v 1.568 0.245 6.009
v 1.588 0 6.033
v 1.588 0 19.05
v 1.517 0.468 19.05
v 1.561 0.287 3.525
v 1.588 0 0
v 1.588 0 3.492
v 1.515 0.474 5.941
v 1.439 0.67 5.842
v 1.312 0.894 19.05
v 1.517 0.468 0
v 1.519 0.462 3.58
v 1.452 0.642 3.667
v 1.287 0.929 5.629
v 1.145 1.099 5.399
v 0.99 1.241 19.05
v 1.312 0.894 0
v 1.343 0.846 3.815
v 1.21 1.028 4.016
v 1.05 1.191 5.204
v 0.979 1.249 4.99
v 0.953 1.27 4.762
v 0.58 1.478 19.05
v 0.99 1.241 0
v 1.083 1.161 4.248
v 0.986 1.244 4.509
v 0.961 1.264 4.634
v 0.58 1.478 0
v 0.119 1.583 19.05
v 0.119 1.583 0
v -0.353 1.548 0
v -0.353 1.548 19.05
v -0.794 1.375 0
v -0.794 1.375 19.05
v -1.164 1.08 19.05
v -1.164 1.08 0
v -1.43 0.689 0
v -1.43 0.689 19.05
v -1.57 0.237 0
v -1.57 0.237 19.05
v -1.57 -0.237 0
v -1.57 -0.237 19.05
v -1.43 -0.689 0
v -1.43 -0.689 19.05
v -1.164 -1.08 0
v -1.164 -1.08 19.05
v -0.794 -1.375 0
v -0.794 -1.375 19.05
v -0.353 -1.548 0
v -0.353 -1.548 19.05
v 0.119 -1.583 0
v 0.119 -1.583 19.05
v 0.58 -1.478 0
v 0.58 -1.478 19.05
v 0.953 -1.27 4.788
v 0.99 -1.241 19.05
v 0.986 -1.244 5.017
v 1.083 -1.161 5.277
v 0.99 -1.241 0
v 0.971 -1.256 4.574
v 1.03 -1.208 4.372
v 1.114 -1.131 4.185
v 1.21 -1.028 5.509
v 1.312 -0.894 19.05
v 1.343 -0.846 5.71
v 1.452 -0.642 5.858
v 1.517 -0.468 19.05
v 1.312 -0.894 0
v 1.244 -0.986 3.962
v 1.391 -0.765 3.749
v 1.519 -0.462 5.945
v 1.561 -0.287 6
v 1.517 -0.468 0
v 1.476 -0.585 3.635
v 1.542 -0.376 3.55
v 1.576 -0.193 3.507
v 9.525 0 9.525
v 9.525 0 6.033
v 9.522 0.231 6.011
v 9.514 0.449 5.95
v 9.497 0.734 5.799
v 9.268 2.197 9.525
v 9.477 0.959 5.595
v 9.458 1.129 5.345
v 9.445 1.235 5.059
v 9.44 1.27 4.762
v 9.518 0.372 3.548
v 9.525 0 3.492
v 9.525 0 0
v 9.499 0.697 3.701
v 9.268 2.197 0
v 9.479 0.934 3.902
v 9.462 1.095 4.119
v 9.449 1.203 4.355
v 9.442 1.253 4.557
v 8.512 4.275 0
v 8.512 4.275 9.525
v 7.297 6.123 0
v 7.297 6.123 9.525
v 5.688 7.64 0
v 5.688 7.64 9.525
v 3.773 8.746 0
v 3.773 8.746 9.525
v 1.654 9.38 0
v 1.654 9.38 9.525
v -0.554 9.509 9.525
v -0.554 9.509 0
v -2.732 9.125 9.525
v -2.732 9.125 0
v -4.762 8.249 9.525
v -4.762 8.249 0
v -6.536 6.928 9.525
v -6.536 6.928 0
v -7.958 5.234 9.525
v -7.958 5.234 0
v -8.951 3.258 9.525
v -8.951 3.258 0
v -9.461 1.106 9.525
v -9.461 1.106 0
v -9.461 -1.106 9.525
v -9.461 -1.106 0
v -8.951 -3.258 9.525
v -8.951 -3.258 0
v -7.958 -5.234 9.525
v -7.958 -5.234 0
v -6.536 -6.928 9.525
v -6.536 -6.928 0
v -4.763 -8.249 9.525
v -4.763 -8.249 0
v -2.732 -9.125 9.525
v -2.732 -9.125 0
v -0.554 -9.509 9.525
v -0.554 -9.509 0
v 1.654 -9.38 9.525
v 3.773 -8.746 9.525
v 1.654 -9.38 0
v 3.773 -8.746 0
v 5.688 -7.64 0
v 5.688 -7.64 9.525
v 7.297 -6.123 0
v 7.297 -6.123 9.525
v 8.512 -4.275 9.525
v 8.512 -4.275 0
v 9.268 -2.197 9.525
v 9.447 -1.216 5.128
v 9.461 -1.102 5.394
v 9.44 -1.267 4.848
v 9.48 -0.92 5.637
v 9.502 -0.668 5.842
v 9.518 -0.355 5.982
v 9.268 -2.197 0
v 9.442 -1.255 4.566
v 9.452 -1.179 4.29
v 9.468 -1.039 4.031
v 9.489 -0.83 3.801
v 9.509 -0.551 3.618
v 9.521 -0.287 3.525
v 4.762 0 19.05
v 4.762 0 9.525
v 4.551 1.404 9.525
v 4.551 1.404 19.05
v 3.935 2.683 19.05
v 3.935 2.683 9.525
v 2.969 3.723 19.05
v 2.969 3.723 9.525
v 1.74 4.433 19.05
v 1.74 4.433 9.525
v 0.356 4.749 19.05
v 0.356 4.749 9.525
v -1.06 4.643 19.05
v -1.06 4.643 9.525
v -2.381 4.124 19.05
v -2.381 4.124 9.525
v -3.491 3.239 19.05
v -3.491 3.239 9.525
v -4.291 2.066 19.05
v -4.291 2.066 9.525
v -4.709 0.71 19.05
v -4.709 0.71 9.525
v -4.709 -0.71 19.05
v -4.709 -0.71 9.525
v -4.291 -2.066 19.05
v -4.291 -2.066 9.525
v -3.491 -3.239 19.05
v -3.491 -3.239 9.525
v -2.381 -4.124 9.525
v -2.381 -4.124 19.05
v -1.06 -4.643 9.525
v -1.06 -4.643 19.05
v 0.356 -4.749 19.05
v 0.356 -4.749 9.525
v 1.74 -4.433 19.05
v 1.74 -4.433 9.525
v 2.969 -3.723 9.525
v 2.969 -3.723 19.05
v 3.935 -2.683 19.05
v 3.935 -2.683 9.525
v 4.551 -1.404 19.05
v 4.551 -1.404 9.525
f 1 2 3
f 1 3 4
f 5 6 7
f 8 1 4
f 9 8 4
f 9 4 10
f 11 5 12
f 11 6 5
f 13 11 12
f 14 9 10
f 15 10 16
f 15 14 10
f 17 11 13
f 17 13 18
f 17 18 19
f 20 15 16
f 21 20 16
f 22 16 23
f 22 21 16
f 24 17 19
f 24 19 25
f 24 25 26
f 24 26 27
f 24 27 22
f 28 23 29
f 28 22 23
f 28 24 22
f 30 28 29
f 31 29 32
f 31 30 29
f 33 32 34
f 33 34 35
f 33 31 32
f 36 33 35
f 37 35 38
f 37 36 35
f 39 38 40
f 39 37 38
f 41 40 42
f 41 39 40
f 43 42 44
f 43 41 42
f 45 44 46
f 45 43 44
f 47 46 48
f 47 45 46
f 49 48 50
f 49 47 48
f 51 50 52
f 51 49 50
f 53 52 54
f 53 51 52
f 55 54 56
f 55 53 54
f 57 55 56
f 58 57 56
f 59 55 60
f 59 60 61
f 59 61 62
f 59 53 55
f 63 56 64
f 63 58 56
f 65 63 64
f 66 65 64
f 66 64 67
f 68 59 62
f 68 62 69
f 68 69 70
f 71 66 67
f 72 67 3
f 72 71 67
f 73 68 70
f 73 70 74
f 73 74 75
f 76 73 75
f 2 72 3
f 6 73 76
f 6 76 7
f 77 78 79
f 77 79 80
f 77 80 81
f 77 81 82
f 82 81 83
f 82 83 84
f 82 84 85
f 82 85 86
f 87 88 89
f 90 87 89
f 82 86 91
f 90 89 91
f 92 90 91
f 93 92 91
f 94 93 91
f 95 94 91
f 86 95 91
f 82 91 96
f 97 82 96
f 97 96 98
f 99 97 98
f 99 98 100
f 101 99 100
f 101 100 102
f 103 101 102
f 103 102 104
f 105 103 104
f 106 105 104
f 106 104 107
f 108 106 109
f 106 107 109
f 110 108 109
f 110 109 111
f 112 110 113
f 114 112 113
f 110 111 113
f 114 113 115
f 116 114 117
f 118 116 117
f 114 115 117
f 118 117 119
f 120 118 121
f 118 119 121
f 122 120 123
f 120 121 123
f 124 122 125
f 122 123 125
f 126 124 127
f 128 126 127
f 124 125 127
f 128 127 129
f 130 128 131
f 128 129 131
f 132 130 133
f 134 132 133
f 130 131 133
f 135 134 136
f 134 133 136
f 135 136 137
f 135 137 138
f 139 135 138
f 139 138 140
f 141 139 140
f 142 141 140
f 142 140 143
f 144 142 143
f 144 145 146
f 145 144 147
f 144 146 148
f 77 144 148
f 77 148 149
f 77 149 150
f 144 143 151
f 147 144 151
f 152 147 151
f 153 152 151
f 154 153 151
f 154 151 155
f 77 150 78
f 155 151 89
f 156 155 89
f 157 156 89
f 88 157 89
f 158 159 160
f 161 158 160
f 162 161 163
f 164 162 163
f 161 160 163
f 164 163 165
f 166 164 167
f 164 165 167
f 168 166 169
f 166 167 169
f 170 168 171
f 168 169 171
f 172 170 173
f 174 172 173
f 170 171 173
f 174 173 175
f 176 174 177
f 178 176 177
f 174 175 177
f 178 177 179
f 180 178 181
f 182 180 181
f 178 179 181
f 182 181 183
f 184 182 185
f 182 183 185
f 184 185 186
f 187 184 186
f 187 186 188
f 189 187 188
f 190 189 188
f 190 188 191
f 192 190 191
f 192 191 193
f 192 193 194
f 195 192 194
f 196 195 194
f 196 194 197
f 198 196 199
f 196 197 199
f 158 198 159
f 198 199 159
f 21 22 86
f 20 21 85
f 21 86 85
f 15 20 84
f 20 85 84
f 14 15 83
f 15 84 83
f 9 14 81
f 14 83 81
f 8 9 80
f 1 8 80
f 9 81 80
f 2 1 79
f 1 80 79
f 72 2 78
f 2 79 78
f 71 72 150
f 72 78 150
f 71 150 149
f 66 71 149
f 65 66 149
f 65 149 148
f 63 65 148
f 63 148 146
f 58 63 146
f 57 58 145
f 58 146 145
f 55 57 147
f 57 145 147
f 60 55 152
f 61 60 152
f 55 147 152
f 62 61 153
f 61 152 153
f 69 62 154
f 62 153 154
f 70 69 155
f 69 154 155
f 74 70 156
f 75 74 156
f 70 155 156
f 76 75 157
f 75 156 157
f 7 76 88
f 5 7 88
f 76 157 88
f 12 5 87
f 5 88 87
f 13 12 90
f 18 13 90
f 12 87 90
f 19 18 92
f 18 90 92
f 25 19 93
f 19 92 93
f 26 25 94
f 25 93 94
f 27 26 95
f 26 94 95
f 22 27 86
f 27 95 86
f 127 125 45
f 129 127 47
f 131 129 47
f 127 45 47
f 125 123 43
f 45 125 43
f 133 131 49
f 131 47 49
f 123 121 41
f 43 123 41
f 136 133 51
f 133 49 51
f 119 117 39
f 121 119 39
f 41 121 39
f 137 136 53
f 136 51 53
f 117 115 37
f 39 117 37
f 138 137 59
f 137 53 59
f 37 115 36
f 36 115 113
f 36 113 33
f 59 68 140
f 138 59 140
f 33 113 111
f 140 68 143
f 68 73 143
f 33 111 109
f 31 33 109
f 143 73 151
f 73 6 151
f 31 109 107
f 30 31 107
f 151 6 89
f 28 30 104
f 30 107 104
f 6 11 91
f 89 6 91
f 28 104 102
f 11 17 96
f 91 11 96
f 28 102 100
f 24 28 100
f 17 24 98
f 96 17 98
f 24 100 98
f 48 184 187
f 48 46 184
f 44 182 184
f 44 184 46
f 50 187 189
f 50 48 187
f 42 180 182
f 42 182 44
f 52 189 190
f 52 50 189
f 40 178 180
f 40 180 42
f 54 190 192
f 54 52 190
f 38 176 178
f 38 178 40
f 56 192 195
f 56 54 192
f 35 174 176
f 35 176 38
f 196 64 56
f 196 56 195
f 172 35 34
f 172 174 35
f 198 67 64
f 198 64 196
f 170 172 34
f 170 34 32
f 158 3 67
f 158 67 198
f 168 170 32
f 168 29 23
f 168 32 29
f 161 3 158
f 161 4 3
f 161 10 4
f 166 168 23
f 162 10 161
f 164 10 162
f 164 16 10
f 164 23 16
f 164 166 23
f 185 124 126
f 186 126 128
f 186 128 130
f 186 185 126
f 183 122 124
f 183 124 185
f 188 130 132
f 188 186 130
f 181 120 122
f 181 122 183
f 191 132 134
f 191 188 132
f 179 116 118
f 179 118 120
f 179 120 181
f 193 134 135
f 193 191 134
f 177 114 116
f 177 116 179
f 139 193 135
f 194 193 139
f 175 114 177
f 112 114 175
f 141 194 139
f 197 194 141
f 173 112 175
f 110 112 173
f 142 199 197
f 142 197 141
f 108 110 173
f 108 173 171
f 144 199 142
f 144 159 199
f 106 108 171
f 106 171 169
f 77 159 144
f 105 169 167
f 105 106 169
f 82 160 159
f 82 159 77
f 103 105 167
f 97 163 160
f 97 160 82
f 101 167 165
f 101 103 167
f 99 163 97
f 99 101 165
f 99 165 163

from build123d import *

# Parameters (mm, degrees)
F0_R     = 9.525
F0_R_2   = 1.5875
F1_DEPTH = 9.525
F2_R     = 4.7625
F2_R_2   = 1.5875
F3_DEPTH = 9.525
F5_R     = 1.27
F6_DEPTH = 9.525


with BuildPart() as f1:
    # F0 (on Top) → F1 (new body)
    with BuildSketch(Plane.XY):
        Circle(F0_R)
        Circle(F0_R_2, mode=Mode.SUBTRACT)
    extrude(amount=F1_DEPTH)

    # F2 (on face) → F3 (join)
    with BuildSketch(Plane.XY.offset(9.525)):
        Circle(F2_R)
        Circle(F2_R_2, mode=Mode.SUBTRACT)
    extrude(amount=F3_DEPTH)

    # F5 (on offset) → F6 (cut)
    with BuildSketch(Plane.YZ.offset(9.525)):
        with Locations((0, 4.7625)):
            Circle(F5_R)
    extrude(amount=-F6_DEPTH, mode=Mode.SUBTRACT)


solid = f1.part
